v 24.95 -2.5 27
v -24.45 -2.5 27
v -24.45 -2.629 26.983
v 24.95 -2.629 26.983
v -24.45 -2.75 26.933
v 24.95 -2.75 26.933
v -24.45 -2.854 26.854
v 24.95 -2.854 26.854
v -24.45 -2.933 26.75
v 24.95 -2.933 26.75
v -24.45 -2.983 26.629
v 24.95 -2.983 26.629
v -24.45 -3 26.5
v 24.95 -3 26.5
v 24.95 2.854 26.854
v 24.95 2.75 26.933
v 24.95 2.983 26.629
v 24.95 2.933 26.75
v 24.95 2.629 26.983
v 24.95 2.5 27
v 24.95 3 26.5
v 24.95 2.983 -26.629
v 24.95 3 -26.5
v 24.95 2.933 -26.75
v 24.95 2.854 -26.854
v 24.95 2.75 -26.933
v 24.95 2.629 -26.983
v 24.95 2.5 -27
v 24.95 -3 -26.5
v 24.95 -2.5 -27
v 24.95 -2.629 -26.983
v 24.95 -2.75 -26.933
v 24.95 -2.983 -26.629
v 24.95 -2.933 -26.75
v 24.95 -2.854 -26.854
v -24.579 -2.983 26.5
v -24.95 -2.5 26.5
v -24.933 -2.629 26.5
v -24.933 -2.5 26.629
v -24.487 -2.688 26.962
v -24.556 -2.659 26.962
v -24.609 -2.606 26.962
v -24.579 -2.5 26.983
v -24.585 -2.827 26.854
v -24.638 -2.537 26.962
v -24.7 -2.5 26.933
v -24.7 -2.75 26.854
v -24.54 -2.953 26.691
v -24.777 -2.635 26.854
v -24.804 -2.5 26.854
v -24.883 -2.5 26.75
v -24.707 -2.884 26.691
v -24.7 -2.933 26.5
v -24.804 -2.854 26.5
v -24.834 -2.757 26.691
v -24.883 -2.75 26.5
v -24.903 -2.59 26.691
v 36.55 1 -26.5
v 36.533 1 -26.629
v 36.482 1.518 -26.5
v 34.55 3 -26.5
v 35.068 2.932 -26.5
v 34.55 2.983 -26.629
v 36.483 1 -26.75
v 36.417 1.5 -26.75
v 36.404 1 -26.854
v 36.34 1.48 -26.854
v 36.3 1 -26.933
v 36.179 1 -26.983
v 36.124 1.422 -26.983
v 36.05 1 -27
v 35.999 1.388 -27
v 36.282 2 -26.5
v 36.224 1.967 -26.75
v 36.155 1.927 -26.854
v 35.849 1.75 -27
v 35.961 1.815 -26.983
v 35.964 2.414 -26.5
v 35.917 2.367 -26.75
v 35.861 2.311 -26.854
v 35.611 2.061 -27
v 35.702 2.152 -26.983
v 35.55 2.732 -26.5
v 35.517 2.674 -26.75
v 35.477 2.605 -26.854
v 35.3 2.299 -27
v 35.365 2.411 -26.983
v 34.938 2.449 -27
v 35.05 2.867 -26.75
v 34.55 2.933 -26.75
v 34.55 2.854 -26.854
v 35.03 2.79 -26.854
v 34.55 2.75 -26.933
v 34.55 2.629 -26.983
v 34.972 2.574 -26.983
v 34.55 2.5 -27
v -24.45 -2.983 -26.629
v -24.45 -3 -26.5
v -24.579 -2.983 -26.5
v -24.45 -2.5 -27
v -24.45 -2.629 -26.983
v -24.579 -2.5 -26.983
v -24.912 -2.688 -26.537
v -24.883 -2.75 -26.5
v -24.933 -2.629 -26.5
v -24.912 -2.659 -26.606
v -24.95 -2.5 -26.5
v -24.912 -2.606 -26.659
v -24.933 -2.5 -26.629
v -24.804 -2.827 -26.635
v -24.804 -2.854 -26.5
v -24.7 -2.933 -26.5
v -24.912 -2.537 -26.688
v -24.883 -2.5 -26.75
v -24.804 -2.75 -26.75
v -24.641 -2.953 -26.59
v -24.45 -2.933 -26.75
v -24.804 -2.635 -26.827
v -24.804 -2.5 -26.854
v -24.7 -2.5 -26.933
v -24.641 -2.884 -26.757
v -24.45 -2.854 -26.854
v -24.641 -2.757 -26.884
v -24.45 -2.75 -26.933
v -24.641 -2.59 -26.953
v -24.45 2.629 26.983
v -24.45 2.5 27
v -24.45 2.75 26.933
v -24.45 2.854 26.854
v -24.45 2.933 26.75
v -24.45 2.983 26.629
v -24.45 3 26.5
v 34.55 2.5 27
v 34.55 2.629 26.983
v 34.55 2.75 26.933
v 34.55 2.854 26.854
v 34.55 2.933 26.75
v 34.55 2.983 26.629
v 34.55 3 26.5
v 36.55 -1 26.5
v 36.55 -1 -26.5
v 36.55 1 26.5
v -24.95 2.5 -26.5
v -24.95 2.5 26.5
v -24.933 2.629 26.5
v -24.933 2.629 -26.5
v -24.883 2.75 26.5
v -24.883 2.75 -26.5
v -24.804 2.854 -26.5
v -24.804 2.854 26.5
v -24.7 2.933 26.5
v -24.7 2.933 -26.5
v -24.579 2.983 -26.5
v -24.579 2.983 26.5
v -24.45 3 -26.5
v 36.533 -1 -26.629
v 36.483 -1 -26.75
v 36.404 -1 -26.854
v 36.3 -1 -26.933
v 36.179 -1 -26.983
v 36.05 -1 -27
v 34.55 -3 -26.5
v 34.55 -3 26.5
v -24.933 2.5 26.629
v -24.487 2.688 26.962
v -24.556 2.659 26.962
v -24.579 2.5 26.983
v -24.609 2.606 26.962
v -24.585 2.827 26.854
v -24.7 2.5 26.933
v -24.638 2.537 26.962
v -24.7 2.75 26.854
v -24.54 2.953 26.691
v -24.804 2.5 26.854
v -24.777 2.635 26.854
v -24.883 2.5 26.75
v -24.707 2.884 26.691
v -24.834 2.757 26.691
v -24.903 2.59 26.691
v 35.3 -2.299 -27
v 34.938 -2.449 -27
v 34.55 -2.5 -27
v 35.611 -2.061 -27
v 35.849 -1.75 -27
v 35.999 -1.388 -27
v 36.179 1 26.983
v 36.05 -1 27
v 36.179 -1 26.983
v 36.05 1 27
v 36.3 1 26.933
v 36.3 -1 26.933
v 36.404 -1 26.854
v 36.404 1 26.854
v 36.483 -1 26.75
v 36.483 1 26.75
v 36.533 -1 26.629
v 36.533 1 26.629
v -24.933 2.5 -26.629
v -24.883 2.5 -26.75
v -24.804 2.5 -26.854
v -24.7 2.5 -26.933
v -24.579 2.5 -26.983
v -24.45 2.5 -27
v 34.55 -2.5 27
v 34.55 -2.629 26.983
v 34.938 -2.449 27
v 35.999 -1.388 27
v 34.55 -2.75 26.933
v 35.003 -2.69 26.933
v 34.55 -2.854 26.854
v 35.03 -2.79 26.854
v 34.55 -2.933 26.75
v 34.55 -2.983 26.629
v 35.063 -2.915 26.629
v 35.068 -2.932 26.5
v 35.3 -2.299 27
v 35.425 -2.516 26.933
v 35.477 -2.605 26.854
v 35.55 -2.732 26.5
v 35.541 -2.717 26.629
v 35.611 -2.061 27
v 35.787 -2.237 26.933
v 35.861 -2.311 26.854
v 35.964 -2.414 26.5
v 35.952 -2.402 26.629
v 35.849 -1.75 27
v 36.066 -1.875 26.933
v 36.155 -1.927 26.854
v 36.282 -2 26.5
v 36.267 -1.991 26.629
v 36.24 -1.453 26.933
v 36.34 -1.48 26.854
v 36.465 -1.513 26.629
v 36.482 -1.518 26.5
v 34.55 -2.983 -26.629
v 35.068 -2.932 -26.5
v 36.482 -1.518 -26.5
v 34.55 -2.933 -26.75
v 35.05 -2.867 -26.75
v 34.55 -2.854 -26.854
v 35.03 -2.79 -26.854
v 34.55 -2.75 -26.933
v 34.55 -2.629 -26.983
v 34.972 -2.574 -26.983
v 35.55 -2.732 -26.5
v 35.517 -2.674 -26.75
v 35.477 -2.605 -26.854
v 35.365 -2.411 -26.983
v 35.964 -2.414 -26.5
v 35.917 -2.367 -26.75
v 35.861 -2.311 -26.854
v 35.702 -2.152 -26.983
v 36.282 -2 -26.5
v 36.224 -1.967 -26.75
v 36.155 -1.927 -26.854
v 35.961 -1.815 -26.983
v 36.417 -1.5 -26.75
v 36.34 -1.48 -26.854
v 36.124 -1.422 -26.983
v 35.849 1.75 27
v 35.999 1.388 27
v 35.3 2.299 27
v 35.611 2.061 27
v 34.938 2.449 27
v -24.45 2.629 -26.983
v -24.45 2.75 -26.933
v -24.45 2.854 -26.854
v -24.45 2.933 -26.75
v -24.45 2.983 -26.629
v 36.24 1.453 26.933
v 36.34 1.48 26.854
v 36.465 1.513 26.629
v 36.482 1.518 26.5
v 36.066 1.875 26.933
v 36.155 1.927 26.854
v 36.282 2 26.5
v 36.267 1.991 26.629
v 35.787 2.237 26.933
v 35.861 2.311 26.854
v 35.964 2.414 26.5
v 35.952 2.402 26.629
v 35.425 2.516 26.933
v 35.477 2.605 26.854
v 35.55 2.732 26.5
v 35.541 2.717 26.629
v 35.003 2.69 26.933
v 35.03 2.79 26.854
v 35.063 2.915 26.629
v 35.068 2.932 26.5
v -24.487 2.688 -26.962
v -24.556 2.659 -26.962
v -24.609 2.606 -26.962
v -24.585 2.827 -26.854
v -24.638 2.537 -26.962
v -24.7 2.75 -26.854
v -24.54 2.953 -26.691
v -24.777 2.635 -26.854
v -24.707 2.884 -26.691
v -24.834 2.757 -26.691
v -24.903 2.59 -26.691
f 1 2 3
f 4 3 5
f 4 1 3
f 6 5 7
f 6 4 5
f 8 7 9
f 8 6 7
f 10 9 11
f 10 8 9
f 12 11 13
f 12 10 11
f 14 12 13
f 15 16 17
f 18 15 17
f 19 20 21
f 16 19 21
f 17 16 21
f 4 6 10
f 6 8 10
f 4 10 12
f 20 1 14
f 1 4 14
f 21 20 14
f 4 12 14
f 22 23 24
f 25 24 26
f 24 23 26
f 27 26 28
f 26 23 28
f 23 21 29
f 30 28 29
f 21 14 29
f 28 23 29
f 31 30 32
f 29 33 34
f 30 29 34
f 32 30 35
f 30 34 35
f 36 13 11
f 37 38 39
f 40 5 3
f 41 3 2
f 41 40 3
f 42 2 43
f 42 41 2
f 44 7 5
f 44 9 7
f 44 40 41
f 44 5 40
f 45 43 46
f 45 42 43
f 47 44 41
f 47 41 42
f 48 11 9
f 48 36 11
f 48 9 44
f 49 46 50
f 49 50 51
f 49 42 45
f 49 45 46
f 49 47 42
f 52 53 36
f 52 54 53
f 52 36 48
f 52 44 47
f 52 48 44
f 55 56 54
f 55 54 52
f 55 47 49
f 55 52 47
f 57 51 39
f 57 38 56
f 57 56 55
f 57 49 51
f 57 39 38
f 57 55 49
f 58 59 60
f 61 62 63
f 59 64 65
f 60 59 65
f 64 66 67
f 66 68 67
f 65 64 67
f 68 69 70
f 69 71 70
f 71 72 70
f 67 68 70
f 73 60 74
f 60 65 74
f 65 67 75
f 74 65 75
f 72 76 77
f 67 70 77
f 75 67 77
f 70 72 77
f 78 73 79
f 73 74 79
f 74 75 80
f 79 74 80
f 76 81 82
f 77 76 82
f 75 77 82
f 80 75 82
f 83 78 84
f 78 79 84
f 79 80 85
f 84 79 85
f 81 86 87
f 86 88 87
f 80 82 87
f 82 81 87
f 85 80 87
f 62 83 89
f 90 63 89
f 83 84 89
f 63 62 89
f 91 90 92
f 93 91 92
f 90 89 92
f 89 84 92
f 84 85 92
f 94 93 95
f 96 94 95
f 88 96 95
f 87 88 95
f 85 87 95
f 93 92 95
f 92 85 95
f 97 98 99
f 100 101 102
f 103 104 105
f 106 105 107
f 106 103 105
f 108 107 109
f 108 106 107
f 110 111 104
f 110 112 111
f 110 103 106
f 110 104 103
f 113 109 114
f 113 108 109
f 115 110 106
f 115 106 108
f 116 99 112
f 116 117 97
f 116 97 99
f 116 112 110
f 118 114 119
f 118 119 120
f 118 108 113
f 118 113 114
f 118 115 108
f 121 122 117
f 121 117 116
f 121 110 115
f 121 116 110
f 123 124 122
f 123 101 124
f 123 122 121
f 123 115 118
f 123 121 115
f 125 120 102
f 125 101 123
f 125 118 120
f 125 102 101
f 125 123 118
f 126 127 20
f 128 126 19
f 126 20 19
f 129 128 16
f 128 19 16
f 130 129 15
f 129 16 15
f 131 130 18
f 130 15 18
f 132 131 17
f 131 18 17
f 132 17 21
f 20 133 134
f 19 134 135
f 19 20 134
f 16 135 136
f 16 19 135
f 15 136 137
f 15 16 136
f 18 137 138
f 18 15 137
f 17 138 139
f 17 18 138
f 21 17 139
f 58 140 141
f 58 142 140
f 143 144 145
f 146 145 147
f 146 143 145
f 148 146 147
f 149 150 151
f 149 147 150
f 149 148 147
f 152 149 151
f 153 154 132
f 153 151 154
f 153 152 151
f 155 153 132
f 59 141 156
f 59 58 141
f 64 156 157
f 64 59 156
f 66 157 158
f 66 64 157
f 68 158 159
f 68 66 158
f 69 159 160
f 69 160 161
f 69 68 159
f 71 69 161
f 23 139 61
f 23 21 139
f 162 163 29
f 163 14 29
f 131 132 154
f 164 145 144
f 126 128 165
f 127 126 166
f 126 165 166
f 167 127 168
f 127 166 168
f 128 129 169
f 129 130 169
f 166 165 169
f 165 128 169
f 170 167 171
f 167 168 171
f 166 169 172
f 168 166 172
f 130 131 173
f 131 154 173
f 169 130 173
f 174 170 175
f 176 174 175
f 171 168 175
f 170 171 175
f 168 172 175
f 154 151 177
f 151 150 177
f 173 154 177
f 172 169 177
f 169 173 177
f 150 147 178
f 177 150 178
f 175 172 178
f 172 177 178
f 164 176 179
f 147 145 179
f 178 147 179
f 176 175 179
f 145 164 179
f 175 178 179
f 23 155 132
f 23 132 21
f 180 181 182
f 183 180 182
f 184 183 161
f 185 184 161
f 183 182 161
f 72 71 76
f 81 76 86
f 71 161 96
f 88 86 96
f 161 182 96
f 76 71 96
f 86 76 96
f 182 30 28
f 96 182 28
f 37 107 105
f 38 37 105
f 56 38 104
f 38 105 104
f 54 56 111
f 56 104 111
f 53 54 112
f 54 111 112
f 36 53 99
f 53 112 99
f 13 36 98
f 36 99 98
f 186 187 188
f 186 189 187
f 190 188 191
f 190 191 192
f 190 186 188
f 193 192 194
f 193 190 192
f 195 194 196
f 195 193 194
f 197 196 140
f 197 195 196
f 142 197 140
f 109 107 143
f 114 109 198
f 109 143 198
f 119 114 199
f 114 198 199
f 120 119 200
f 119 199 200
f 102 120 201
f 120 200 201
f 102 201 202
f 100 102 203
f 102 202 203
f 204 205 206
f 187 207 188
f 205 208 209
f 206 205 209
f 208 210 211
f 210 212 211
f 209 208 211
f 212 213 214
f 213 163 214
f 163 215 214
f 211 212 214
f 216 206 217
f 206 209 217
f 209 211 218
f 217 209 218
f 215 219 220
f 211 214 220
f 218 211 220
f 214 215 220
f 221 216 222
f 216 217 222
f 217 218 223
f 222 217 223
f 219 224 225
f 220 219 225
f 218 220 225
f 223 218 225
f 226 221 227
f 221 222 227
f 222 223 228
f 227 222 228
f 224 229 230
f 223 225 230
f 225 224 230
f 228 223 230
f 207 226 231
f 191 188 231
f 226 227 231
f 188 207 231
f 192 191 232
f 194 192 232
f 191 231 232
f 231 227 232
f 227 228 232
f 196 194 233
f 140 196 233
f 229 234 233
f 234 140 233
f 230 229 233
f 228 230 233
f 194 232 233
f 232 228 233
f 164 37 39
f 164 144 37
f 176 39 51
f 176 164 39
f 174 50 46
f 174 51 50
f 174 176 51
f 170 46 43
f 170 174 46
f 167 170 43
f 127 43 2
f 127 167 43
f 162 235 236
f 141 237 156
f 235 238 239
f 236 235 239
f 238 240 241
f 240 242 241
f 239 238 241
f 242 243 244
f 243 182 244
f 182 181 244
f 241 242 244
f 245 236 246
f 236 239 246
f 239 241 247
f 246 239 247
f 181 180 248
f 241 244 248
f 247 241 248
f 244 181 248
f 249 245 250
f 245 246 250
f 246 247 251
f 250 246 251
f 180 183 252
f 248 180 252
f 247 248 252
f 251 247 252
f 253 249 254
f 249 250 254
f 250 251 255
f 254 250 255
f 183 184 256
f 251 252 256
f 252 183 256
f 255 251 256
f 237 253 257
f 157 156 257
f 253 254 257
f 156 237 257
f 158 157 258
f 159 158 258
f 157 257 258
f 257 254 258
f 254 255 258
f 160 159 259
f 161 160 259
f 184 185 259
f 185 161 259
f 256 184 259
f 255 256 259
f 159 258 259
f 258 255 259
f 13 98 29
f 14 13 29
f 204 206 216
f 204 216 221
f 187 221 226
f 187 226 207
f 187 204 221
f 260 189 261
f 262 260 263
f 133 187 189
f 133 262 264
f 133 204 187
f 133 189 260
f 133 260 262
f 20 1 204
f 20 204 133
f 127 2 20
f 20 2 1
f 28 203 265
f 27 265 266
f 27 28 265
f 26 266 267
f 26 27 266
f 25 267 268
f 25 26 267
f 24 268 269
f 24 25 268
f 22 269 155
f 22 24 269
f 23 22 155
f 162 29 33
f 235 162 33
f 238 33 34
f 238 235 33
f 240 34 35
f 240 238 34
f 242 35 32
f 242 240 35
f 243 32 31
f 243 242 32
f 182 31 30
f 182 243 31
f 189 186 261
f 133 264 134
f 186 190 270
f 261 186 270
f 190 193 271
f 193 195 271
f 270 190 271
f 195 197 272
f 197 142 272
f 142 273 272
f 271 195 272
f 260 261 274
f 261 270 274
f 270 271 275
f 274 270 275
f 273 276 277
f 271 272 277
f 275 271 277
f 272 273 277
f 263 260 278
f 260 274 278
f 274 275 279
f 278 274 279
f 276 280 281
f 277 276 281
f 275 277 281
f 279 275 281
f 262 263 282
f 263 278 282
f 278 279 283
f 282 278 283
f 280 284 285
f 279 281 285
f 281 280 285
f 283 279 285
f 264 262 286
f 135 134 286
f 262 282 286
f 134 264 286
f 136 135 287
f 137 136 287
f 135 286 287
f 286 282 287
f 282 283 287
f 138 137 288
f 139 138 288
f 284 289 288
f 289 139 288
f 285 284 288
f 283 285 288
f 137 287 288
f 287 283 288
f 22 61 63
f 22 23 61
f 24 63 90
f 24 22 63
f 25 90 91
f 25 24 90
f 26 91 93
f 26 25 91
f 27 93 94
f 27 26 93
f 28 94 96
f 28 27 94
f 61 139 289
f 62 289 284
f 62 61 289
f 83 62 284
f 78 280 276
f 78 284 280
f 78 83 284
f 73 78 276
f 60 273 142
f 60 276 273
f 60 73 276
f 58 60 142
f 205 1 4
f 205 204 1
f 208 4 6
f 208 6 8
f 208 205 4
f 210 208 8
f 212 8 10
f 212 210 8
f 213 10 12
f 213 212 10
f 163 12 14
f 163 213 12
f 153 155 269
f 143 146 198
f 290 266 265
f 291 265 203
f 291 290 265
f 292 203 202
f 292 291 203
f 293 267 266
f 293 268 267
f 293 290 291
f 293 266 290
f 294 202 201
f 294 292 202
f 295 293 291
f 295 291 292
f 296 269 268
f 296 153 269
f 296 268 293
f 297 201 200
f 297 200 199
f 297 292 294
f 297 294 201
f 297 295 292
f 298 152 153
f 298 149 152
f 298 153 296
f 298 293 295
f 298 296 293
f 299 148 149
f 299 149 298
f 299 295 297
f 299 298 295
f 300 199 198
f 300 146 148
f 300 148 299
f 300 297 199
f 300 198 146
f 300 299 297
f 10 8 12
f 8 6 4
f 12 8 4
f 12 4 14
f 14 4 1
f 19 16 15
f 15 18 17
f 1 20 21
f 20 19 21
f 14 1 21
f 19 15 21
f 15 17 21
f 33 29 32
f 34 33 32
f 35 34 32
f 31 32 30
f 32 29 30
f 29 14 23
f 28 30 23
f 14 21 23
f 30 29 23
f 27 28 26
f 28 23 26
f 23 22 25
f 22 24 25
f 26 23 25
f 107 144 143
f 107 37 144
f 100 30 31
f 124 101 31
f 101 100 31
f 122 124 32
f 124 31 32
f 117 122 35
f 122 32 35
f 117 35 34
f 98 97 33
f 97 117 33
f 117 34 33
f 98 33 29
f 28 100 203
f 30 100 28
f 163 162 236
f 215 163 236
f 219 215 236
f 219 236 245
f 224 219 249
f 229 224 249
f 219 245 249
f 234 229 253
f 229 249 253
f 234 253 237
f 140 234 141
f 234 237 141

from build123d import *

# Parameters (mm, degrees)
BOSS_EXTRUDE1_DEPTH      = 3
BOSS_EXTRUDE1_DEPTH_BACK = 3
SKETCH1_W                = 49.9
SKETCH1_H                = 54
SKETCH4_W                = 54
SKETCH4_H                = 6
BOSS_EXTRUDE4_DEPTH      = 11.6
FILLET1_R                = 2
FILLET3_R                = 0.5
FILLET4_R                = 0.5


with BuildPart() as part:
    # Sketch1 → Boss-Extrude1 (new, two sides: drawn at the far end of the back side and taken through both)
    with BuildSketch(Plane(origin=(0, 0, 0), x_dir=(1, 0, 0), z_dir=(0, 1, 0)).offset(-BOSS_EXTRUDE1_DEPTH_BACK)):
        Rectangle(SKETCH1_W, SKETCH1_H)
    extrude(amount=BOSS_EXTRUDE1_DEPTH + BOSS_EXTRUDE1_DEPTH_BACK)

    # Fillet4
    fillet4_edges = [part.edges().sort_by_distance(p)[0] for p in [
        (-24.95, 3, 0),
        (0, 3, 27),
        (0, -3, -27),
        (0, 3, -27),
        (-24.95, -3, 0),
        (0, -3, 27),
        (-24.95, 0, -27),
        (-24.95, 0, 27),
    ]]
    fillet(fillet4_edges, radius=FILLET4_R)


with BuildPart() as body_2:
    # Sketch4 → Boss-Extrude4 (new body)
    with BuildSketch(Plane(origin=(24.95, 0, 0), x_dir=(0, 0, -1), z_dir=(1, 0, 0))):
        Rectangle(SKETCH4_W, SKETCH4_H)
    extrude(amount=BOSS_EXTRUDE4_DEPTH)

    # Fillet1
    fillet1_edges = [body_2.edges().sort_by_distance(p)[0] for p in [
        (36.55, 3, 0),
        (36.55, -3, 0),
    ]]
    fillet(fillet1_edges, radius=FILLET1_R)

    # Fillet3
    fillet3_edges = [body_2.edges().sort_by_distance(p)[0] for p in [
        (36.55, 0, 27),
        (36.55, 0, -27),
        (29.75, 3, -27),
        (29.75, -3, -27),
        (35.964213562, 2.414213562, -27),
        (35.964213562, -2.414213562, -27),
        (29.75, -3, 27),
        (29.75, 3, 27),
        (35.964213562, 2.414213562, 27),
        (35.964213562, -2.414213562, 27),
    ]]
    fillet(fillet3_edges, radius=FILLET3_R)


solid = Compound([part.part, body_2.part])
